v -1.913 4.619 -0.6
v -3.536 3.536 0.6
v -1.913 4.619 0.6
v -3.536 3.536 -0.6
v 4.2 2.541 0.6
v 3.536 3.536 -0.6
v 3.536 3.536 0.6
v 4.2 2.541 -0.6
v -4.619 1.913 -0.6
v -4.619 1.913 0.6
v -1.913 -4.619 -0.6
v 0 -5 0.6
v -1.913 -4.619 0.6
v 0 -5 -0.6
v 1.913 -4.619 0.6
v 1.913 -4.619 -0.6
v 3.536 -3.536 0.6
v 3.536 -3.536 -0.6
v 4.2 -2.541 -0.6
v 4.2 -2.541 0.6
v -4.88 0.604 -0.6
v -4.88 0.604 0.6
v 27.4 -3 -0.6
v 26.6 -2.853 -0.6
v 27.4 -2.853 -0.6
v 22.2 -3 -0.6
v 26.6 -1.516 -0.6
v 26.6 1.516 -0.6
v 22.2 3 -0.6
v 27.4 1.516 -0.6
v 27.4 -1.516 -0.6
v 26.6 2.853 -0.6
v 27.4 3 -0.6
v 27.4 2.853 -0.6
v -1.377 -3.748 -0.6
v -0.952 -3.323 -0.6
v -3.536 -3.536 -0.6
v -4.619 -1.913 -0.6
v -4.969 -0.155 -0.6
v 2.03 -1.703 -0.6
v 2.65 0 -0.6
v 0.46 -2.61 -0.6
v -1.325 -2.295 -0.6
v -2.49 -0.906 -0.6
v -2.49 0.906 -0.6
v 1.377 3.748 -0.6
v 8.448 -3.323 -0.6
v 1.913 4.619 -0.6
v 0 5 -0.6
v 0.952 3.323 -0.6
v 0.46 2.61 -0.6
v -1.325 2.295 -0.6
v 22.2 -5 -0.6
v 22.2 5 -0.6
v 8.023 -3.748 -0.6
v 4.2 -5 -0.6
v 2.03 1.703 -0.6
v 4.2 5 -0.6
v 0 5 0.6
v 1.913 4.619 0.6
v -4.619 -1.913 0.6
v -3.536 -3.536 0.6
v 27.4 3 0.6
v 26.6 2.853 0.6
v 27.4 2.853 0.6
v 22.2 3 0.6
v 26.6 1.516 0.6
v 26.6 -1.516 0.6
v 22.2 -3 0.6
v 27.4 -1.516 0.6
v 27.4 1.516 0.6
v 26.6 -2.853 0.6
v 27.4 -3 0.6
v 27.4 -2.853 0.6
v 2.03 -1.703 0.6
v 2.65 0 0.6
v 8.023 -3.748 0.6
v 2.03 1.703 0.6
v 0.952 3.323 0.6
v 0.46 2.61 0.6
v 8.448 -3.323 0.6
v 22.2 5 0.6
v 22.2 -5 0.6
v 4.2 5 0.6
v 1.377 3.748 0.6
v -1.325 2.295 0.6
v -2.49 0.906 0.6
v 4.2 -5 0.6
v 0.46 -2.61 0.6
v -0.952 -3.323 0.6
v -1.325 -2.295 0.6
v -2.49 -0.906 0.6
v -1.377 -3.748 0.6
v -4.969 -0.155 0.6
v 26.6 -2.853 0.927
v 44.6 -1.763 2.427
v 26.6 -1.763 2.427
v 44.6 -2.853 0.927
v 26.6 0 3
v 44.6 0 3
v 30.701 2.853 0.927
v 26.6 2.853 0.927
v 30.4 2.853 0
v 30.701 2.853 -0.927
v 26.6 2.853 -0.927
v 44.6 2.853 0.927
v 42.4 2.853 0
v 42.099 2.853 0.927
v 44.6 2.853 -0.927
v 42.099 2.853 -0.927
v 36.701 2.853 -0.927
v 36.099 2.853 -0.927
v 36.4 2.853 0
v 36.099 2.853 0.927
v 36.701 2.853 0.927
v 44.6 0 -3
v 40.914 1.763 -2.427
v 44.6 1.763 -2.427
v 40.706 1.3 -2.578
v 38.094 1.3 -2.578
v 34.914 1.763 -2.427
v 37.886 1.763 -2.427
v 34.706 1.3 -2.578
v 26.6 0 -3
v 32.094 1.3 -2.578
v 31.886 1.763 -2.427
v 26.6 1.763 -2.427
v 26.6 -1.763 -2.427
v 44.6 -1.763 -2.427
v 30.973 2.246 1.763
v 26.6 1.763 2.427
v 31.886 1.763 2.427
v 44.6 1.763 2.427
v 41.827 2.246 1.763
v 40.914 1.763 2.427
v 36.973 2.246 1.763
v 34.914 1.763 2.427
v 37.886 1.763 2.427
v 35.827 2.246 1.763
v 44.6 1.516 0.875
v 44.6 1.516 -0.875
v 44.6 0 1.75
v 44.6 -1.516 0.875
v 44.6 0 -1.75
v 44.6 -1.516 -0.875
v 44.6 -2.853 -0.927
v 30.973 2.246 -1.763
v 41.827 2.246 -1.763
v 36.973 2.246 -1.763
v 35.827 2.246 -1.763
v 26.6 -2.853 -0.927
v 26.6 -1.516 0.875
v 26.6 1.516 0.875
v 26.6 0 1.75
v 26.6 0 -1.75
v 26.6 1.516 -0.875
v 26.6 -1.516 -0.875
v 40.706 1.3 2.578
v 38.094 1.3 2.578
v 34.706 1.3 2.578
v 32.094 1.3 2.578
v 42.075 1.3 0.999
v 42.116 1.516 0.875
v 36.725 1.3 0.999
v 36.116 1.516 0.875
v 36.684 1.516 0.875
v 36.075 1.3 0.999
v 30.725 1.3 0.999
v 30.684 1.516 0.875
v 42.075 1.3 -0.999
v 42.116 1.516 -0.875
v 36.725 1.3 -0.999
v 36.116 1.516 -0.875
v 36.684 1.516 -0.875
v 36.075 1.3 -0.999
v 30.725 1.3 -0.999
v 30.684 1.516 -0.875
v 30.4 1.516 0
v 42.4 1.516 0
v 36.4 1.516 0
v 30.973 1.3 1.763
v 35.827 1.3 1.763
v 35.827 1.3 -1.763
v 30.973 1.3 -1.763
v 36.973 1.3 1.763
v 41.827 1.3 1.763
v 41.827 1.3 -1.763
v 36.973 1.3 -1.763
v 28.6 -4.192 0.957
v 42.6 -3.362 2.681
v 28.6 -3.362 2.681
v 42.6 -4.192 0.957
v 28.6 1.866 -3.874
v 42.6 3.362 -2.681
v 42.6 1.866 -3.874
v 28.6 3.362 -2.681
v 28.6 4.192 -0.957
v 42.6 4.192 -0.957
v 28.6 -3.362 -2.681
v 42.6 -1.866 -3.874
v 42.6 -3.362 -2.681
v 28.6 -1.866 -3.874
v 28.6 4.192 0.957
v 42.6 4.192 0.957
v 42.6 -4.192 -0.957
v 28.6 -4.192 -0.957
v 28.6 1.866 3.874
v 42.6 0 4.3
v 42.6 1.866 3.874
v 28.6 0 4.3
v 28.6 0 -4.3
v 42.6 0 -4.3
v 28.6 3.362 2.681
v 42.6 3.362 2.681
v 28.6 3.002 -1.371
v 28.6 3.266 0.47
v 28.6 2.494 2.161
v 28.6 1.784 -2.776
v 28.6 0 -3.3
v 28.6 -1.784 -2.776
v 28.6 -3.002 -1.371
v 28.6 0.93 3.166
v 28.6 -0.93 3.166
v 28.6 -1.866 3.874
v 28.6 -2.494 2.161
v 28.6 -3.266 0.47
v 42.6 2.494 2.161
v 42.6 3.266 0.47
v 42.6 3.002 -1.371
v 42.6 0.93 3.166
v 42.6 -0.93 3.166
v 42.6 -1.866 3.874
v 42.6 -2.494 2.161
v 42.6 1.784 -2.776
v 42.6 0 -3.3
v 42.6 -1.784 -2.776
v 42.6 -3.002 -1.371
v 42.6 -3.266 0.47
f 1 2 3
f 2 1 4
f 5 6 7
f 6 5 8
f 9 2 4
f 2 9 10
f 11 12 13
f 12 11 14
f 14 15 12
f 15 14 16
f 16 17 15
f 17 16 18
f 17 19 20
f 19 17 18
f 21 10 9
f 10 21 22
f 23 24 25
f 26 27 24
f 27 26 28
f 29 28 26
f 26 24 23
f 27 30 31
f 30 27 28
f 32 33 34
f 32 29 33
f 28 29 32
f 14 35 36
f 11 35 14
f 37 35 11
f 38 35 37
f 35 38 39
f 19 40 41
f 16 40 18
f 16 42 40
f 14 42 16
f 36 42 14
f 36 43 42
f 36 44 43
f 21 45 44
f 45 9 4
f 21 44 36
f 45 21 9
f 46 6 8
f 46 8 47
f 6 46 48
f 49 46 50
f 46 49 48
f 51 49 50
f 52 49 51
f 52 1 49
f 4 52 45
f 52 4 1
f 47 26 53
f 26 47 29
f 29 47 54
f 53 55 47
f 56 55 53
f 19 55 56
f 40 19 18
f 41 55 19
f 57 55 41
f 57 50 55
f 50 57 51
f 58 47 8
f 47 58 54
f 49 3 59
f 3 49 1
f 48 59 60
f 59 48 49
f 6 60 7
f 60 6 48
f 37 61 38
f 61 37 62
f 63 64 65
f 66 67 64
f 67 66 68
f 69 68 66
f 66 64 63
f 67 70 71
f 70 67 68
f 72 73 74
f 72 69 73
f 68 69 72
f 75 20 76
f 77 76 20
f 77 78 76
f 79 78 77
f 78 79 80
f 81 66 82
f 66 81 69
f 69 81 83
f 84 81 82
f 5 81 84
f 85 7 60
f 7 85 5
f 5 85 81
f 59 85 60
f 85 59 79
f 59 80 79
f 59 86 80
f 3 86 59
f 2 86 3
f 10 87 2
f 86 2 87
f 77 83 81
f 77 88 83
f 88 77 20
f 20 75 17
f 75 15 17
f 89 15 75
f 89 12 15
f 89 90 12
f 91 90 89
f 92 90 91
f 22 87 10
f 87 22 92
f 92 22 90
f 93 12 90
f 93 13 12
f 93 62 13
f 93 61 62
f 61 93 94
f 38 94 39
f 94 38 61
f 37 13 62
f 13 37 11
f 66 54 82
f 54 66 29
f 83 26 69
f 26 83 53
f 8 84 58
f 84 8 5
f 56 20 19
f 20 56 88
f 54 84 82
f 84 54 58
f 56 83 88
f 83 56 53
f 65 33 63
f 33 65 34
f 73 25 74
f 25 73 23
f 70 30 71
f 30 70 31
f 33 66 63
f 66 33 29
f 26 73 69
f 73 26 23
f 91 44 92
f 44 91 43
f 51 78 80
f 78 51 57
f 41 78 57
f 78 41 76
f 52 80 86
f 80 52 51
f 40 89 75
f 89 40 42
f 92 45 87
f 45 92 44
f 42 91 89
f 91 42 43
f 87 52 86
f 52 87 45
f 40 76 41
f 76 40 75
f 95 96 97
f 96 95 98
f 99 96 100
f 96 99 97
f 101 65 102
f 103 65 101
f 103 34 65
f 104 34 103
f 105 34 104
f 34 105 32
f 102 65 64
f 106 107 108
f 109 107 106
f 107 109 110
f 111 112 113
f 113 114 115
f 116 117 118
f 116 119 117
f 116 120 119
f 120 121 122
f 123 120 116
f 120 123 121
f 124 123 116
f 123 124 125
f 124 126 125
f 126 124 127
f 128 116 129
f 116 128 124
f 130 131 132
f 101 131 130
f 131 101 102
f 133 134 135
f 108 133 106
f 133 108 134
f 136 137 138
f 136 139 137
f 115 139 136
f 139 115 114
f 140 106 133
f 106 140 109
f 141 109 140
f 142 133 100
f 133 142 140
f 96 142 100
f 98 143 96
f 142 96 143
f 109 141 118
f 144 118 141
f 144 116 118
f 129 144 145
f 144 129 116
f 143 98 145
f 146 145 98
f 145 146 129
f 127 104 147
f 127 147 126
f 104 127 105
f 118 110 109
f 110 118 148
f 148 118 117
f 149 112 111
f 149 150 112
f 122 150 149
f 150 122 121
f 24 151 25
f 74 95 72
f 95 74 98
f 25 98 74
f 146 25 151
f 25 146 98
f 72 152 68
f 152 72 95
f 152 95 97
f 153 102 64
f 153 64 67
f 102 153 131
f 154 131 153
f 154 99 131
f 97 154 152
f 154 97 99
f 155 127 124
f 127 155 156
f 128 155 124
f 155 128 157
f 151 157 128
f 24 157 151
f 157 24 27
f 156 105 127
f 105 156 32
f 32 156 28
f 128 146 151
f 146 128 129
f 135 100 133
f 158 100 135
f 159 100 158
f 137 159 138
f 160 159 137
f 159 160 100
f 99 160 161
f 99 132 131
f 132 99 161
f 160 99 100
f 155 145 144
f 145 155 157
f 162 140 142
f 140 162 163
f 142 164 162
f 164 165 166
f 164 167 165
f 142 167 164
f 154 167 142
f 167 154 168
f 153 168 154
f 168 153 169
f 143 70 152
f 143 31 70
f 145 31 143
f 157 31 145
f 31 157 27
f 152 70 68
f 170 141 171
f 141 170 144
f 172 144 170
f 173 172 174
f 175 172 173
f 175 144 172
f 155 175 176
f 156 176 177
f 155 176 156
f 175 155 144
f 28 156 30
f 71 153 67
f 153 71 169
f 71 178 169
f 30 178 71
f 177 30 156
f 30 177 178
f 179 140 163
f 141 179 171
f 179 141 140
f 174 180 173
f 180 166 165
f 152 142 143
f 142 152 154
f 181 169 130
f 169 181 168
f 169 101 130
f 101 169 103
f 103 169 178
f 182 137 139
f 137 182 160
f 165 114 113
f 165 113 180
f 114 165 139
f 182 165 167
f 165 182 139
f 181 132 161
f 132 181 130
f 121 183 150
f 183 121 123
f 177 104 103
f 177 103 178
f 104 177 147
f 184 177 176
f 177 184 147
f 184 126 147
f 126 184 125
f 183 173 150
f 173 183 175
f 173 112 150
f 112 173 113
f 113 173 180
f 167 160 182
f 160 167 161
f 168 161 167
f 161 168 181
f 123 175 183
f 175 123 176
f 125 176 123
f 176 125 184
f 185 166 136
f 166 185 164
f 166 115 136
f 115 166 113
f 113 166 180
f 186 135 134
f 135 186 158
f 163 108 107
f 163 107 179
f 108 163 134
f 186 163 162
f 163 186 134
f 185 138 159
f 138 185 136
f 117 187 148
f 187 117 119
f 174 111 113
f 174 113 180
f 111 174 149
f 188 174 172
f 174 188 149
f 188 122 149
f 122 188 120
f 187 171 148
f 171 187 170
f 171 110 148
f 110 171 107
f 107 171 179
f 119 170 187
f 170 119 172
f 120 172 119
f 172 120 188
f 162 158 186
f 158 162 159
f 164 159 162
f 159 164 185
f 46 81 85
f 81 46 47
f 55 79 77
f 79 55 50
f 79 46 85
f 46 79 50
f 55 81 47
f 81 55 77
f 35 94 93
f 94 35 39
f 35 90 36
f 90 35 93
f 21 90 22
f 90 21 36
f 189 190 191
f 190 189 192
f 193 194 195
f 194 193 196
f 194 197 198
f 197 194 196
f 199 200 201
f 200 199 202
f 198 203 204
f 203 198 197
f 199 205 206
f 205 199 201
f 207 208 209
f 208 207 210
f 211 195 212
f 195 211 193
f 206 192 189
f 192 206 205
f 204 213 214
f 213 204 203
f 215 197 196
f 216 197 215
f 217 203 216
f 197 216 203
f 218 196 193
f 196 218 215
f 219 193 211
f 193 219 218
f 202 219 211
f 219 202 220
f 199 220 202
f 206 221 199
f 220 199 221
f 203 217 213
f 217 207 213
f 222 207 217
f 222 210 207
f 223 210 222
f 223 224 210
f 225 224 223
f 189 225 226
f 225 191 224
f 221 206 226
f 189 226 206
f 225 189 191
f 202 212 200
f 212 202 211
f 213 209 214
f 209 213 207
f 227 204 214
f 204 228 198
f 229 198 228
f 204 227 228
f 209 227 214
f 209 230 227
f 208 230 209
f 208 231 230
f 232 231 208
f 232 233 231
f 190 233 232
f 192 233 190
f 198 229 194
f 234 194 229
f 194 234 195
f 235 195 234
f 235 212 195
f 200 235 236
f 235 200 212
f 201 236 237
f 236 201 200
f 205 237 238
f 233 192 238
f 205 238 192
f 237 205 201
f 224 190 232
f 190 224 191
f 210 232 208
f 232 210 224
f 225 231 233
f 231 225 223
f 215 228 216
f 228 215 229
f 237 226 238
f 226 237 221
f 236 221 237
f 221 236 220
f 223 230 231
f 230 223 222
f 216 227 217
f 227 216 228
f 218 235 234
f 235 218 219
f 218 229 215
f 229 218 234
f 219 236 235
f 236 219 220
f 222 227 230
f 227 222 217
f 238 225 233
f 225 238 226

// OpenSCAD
// Parameters
tongue_length = 18; //[9:36:1]
tongue_width = 10; //[5:20:1]
tongue_thickness = 1.2; //[0.6:2.4:0.1]
hole_diameter = 5.3; //[2.65:10.6:0.1]
ring_outer_diameter = 10; //[5:20:0.5]
neck_length = 6; //[3:12:1]
neck_width = 6; //[3:12:1]
barrel_length = 18; //[9:36:1]
barrel_outer_diameter = 6; //[3:12:0.5]
barrel_inner_diameter = 3.5; //[1.5:9:0.1]
overlap = 0.8; //[0.5:2:0.1]
crimp_indent_depth = 0.6; //[0.2:1.5:0.1]
crimp_indent_width = 2.2; //[1:5:0.1]
crimp_indent_count = 2; //[1:4:1]
sleeve_thickness = 1; //[0.5:2.5:0.1]
sleeve_length = 14; //[7:28:1]
sleeve_clearance = 0.3; //[0.1:1:0.1]
chamfer_size = 0.6; //[0.2:1.5:0.1]

// Base Shapes
module ring_tongue_disc() {
  translate([0, 0, 0])
    cylinder(r=ring_outer_diameter/2, h=tongue_thickness, center=true);
}

module tongue_rect() {
  translate([ring_outer_diameter/2 + tongue_length/2 - overlap, 0, 0])
    cube([tongue_length, tongue_width, tongue_thickness], center=true);
}

module tongue_to_barrel_neck() {
  translate([ring_outer_diameter/2 + tongue_length - overlap + neck_length/2 - overlap, 0, 0])
    cube([neck_length, neck_width, tongue_thickness], center=true);
}

module wire_barrel_outer() {
  translate([ring_outer_diameter/2 + tongue_length - overlap + neck_length - overlap + barrel_length/2 - overlap, 0, 0])
    rotate([0, 90, 0])
      cylinder(r=barrel_outer_diameter/2, h=barrel_length, center=true);
}

module mounting_hole() {
  translate([0, 0, 0])
    cylinder(r=hole_diameter/2, h=tongue_thickness + 2*overlap, center=true);
}

module barrel_wire_entry_hole() {
  translate([ring_outer_diameter/2 + tongue_length - overlap + neck_length - overlap + barrel_length/2 - overlap, 0, 0])
    rotate([0, 90, 0])
      cylinder(r=barrel_inner_diameter/2, h=barrel_length + 2*overlap, center=true);
}

module crimp_indent_1() {
  translate([ring_outer_diameter/2 + tongue_length - overlap + neck_length - overlap + barrel_length*(1/(crimp_indent_count+1)), barrel_outer_diameter/2 - crimp_indent_depth, 0])
    rotate([90, 0, 0])
      cylinder(r=barrel_outer_diameter/2, h=crimp_indent_width, center=true);
}

module crimp_indent_2() {
  translate([ring_outer_diameter/2 + tongue_length - overlap + neck_length - overlap + barrel_length*(2/(crimp_indent_count+1)), barrel_outer_diameter/2 - crimp_indent_depth, 0])
    rotate([90, 0, 0])
      cylinder(r=barrel_outer_diameter/2, h=crimp_indent_width, center=true);
}

module edge_chamfer_cut_ring_posx() {
  translate([ring_outer_diameter/2 - chamfer_size/2, 0, 0])
    rotate([0, 0, 45])
      cube([chamfer_size, ring_outer_diameter, tongue_thickness + 2*overlap], center=true);
}

module edge_chamfer_cut_ring_negx() {
  translate([-ring_outer_diameter/2 + chamfer_size/2, 0, 0])
    rotate([0, 0, 45])
      cube([chamfer_size, ring_outer_diameter, tongue_thickness + 2*overlap], center=true);
}

module insulation_sleeve_outer() {
  translate([ring_outer_diameter/2 + tongue_length - overlap + neck_length - overlap + (barrel_length - sleeve_length)/2 + sleeve_length/2 - overlap, 0, 0])
    rotate([0, 90, 0])
      cylinder(r=barrel_outer_diameter/2 + sleeve_clearance + sleeve_thickness, h=sleeve_length, center=true);
}

module insulation_sleeve_inner() {
  translate([ring_outer_diameter/2 + tongue_length - overlap + neck_length - overlap + (barrel_length - sleeve_length)/2 + sleeve_length/2 - overlap, 0, 0])
    rotate([0, 90, 0])
      cylinder(r=barrel_outer_diameter/2 + sleeve_clearance, h=sleeve_length + 2*overlap, center=true);
}

// Operations
module tongue_union() {
  union() {
    ring_tongue_disc();
    tongue_rect();
    tongue_to_barrel_neck();
  }
}

module tongue_with_hole() {
  difference() {
    tongue_union();
    mounting_hole();
  }
}

module barrel_solid() {
  union() {
    wire_barrel_outer();
  }
}

module barrel_hollow() {
  difference() {
    barrel_solid();
    barrel_wire_entry_hole();
  }
}

module barrel_with_crimps() {
  difference() {
    barrel_hollow();
    crimp_indent_1();
    crimp_indent_2();
  }
}

module metal_body_union() {
  union() {
    tongue_with_hole();
    barrel_with_crimps();
  }
}

module metal_body_with_edge_chamfers() {
  difference() {
    metal_body_union();
    edge_chamfer_cut_ring_posx();
    edge_chamfer_cut_ring_negx();
  }
}

module insulation_sleeve_hollow() {
  difference() {
    insulation_sleeve_outer();
    insulation_sleeve_inner();
  }
}

// Final Model
module complete_model() {
  union() {
    metal_body_with_edge_chamfers();
    insulation_sleeve_hollow();
  }
}

// Render the complete model
complete_model();
